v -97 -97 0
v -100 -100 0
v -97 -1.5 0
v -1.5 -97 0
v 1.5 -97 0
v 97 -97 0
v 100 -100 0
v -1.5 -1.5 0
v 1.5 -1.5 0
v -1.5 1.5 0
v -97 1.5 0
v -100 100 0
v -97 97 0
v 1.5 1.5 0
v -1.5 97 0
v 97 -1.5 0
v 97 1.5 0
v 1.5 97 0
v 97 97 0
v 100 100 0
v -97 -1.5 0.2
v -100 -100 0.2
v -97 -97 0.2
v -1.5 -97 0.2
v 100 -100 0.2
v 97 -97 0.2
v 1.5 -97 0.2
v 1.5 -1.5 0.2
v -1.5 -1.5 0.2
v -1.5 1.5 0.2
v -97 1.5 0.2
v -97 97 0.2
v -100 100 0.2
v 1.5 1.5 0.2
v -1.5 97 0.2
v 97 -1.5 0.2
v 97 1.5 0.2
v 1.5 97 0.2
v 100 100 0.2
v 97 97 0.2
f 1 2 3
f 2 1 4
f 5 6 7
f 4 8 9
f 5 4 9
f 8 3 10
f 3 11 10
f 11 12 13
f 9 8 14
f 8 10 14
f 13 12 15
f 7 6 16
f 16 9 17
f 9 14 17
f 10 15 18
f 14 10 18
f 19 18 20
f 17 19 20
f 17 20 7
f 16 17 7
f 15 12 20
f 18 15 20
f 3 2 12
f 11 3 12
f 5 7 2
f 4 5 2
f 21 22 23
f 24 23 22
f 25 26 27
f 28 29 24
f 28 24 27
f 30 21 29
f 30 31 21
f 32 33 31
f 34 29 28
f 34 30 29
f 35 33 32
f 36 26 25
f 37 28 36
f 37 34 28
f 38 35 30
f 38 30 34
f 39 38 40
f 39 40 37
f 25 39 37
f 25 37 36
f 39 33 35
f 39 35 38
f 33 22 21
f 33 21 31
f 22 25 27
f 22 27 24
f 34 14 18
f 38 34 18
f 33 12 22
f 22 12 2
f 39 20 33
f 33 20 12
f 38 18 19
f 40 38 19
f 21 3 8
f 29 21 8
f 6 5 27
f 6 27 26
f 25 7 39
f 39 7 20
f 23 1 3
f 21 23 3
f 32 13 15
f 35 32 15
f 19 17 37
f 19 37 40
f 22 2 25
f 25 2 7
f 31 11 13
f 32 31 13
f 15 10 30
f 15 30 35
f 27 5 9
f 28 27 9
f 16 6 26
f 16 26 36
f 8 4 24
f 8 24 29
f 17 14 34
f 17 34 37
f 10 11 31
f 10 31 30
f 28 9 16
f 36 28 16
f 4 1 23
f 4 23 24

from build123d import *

# Parameters (mm, degrees)
F0_W     = 95.5
F0_H     = 95.5
F1_DEPTH = 0.2


with BuildPart() as f1:
    # F0 (on Top) → F1 (new body)
    with BuildSketch(Plane.XY):
        Polygon((1.5, -100), (100, -100), (100, -1.5), (100, 1.5), (100, 100), (1.5, 100), (-1.5, 100), (-100, 100), (-100, 1.5), (-100, -1.5), (-100, -100), (-1.5, -100), align=None)
        with Locations((-49.25, -49.25)):
            Rectangle(F0_W, F0_H, mode=Mode.SUBTRACT)
        with Locations((49.25, -49.25)):
            Rectangle(F0_W, F0_H, mode=Mode.SUBTRACT)
        with Locations((-49.25, 49.25)):
            Rectangle(F0_W, F0_H, mode=Mode.SUBTRACT)
        with Locations((49.25, 49.25)):
            Rectangle(F0_W, F0_H, mode=Mode.SUBTRACT)
    extrude(amount=F1_DEPTH)


solid = f1.part
